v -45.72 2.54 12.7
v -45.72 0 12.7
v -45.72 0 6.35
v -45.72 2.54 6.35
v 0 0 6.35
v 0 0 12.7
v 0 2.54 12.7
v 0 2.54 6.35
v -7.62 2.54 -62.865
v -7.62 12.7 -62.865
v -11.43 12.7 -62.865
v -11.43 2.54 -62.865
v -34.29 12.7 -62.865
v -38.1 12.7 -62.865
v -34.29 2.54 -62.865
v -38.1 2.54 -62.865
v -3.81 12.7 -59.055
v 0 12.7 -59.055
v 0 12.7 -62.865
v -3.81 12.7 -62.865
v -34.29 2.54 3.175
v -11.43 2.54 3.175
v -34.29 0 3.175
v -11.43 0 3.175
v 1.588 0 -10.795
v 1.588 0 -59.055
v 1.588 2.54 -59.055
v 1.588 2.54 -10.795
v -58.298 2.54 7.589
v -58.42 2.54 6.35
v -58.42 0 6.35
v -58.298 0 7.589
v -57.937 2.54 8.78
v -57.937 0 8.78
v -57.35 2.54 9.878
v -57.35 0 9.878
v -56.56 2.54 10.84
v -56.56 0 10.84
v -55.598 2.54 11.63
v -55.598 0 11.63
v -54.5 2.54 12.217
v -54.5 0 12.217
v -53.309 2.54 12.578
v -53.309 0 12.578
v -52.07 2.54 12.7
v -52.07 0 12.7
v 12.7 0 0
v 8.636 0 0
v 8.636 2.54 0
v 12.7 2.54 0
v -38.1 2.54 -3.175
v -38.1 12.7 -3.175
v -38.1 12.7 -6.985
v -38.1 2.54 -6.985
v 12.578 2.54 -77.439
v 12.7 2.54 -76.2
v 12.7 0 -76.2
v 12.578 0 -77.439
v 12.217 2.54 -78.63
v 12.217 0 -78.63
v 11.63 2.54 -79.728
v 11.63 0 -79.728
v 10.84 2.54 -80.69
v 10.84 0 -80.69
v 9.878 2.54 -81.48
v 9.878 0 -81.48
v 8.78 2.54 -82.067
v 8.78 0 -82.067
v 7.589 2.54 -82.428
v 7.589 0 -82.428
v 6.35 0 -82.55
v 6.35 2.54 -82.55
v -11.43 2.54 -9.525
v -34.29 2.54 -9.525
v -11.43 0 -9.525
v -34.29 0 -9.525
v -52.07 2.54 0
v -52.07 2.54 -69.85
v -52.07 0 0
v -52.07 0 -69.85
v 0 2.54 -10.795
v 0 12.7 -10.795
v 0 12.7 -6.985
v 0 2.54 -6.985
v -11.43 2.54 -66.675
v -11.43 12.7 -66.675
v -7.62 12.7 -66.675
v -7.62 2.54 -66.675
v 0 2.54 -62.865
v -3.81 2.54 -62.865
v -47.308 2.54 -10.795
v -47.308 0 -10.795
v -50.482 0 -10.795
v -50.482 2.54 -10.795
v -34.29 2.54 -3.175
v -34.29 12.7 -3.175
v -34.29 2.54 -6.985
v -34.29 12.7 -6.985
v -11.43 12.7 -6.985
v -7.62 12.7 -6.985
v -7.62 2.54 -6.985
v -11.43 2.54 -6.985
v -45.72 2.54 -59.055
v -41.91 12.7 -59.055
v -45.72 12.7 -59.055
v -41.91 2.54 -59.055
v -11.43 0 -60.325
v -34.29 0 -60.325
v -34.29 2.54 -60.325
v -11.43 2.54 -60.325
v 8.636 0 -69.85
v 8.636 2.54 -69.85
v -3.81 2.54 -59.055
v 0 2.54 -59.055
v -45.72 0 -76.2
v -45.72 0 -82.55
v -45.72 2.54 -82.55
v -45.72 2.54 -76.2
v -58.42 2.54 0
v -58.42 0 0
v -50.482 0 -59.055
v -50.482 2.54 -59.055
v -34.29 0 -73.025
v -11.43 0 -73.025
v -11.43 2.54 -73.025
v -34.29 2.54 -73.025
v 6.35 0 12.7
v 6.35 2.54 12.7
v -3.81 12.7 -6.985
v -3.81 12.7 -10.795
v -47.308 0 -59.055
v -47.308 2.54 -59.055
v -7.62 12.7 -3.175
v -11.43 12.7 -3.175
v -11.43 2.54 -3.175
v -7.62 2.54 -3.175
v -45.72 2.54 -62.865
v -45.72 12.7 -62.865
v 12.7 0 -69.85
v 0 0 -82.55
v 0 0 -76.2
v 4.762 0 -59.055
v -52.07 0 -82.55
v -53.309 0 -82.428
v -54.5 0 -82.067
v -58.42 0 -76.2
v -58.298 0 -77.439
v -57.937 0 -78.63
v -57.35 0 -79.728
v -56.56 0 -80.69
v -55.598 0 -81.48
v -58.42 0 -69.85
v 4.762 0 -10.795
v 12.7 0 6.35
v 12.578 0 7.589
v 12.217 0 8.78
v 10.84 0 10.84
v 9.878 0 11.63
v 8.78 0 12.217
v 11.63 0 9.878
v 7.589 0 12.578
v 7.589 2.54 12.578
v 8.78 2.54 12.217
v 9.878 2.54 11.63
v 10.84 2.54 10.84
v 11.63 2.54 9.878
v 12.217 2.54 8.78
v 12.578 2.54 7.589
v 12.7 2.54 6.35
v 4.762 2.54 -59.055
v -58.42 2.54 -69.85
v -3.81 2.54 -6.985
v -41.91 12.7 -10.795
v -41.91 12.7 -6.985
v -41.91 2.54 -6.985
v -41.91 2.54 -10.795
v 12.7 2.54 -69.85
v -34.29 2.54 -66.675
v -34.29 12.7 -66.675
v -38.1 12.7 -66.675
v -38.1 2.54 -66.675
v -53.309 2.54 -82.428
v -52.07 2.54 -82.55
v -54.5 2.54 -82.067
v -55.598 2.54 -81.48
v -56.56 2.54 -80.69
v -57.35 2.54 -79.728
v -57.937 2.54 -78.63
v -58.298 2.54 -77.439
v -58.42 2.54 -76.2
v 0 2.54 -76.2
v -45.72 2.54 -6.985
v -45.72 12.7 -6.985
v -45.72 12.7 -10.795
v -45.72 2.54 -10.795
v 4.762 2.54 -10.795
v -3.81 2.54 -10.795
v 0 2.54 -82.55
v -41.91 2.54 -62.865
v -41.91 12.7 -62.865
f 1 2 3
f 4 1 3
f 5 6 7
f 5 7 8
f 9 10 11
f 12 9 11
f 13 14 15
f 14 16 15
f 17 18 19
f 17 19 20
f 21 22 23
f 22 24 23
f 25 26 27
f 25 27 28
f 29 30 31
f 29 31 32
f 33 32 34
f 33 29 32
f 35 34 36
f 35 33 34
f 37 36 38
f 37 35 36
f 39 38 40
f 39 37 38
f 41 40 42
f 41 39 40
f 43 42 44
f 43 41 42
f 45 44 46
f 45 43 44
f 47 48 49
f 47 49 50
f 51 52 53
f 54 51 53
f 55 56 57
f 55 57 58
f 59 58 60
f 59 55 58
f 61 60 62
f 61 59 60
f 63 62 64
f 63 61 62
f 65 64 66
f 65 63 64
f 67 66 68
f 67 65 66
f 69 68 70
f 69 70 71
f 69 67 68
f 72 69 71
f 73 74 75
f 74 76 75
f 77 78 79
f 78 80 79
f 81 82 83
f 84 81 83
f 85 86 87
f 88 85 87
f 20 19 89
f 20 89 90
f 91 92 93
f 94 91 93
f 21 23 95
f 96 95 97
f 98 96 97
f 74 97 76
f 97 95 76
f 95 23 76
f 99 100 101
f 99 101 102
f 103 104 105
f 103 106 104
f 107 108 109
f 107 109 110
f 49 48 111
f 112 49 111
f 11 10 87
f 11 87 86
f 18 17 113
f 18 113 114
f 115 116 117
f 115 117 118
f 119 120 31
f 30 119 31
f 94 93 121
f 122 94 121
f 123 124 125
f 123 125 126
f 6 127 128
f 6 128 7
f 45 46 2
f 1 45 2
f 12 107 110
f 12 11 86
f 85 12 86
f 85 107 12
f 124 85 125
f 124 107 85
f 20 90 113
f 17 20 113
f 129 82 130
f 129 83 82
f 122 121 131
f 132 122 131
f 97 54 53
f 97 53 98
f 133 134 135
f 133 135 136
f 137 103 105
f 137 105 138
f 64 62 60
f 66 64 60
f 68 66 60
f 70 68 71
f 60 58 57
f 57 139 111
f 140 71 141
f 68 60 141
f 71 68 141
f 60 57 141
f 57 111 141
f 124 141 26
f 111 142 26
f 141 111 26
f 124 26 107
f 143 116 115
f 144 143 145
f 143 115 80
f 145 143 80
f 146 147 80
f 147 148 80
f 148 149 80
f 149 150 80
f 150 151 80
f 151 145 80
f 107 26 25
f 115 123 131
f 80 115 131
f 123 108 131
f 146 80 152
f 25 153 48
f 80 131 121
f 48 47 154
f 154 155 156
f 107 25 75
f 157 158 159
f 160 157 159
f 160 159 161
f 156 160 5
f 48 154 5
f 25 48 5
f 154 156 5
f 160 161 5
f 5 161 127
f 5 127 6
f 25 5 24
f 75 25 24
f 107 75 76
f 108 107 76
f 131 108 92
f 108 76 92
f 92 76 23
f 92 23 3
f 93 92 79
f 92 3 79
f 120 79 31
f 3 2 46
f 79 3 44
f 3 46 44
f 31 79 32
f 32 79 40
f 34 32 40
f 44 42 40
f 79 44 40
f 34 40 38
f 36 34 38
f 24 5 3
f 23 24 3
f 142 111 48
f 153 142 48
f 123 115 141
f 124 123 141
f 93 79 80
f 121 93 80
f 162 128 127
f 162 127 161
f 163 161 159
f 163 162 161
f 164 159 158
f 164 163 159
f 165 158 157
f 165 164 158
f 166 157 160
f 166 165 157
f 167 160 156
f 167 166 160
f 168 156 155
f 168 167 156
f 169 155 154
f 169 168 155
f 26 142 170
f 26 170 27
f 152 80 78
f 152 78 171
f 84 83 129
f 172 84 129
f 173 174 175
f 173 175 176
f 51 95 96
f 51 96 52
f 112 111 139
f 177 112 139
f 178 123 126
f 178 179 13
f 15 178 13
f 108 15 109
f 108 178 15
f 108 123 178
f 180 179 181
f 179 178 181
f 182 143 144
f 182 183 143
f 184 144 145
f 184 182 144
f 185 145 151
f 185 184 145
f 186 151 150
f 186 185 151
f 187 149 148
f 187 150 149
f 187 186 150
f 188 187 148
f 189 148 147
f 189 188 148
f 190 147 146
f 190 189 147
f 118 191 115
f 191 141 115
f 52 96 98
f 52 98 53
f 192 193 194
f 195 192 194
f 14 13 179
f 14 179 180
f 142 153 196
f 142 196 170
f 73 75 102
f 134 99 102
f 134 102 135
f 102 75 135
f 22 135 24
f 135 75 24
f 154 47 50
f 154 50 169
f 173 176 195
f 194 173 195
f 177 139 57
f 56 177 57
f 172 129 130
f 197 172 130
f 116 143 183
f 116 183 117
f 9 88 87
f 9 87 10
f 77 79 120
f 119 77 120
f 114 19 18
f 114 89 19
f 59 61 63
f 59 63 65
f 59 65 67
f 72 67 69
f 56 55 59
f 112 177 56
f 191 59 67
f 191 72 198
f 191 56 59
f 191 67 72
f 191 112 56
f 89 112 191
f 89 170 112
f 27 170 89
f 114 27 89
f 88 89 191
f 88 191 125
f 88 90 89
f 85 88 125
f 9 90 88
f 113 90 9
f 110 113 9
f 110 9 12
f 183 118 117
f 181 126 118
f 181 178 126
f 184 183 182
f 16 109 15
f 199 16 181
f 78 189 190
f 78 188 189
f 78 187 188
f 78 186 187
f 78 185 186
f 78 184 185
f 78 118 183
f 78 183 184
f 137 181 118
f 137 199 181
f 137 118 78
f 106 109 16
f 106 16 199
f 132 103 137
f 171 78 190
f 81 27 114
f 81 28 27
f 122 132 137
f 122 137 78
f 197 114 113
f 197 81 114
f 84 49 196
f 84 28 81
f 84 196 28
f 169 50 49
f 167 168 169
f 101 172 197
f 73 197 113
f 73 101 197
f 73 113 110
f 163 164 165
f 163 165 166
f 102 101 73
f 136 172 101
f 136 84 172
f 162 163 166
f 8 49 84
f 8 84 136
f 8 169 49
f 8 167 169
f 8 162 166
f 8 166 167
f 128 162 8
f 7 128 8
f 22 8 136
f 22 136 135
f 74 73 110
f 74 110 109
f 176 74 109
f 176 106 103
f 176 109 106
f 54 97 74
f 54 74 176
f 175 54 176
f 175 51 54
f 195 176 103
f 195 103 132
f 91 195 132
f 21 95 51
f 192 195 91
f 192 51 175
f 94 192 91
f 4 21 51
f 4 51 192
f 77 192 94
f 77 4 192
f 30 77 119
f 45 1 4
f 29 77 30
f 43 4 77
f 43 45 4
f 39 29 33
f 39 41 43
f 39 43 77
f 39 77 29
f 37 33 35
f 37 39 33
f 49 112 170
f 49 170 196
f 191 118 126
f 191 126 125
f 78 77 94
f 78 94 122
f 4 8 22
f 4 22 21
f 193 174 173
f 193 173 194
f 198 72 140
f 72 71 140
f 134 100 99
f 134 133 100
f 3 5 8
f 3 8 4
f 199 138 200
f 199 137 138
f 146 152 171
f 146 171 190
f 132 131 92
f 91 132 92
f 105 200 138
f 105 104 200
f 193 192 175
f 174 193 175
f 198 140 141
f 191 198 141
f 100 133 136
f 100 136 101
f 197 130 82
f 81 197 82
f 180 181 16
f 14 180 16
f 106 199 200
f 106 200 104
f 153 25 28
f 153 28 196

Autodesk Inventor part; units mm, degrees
ref_plane "YZ Plane" through (0, 0, 0) normal (1, 0, 0) x (0, 1, 0)
ref_plane "XZ Plane" through (0, 0, 0) normal (0, 1, 0) x (-1, 0, 0)
ref_plane "XY Plane" through (0, 0, 0) normal (0, 0, 1) x (1, 0, 0)
sketch "Sketch1" plane through (0, 0, 0) normal (0, 1, 0) x (-1, 0, 0)
  line L0 (45.72, 0) -> (45.72, -69.85)
  line L1 (0, -69.85) -> (0, 0)
  line L2 (45.72, -69.85) -> (58.42, -69.85)
  line L3 (58.42, -69.85) -> (58.42, -82.55)
  line L4 (58.42, -82.55) -> (45.72, -82.55)
  line L5 (45.72, -82.55) -> (45.72, -69.85)
  line L6 (45.72, 0) -> (58.42, 0)
  line L7 (58.42, 0) -> (58.42, 12.7)
  line L8 (58.42, 12.7) -> (45.72, 12.7)
  line L9 (45.72, 12.7) -> (45.72, 0)
  line L10 (0, 0) -> (-12.7, 0)
  line L11 (-12.7, 0) -> (-12.7, 12.7)
  line L12 (-12.7, 12.7) -> (0, 12.7)
  line L13 (0, 12.7) -> (0, 0)
  line L14 (0, -69.85) -> (-12.7, -69.85)
  line L15 (-12.7, -69.85) -> (-12.7, -82.55)
  line L16 (-12.7, -82.55) -> (0, -82.55)
  line L17 (0, -82.55) -> (0, -69.85)
  line L18 (0, 0) -> (0, 6.35)
  line L19 (0, 6.35) -> (45.72, 6.35)
  line L20 (45.72, 6.35) -> (45.72, 0)
  line L21 (0, -69.85) -> (0, -76.2)
  line L22 (0, -76.2) -> (45.72, -76.2)
  line L23 (45.72, -76.2) -> (45.72, -69.85)
  line L24 (45.72, -69.85) -> (52.07, -69.85)
  line L25 (52.07, -69.85) -> (52.07, 0)
  line L26 (52.07, 0) -> (45.72, 0)
  line L27 (45.72, 0) -> (45.72, -69.85)
  line L28 (0, 0) -> (-8.636, 0)
  line L29 (-8.636, 0) -> (-8.636, -69.85)
  line L30 (-8.636, -69.85) -> (0, -69.85)
  line L31 (0, -69.85) -> (0, 0)
  line L32 (0, 3.175) -> (0, -9.525)
  line L33 (45.72, -9.525) -> (45.72, 3.175)
  line L34 (0, -73.025) -> (0, -60.325)
  line L35 (45.72, -60.325) -> (45.72, -73.025)
  line L36 (34.29, -60.325) -> (11.43, -60.325)
  line L37 (11.43, -60.325) -> (11.43, -73.025)
  line L38 (11.43, -73.025) -> (34.29, -73.025)
  line L39 (34.29, -73.025) -> (34.29, -60.325)
  line L40 (34.29, -9.525) -> (11.43, -9.525)
  line L41 (11.43, -9.525) -> (11.43, 3.175)
  line L42 (11.43, 3.175) -> (34.29, 3.175)
  line L43 (34.29, 3.175) -> (34.29, -9.525)
  line L44 (11.43, -3.175) -> (7.62, -3.175)
  line L45 (7.62, -3.175) -> (7.62, -6.985)
  line L46 (7.62, -6.985) -> (11.43, -6.985)
  line L47 (11.43, -6.985) -> (11.43, -3.175)
  line L48 (0, -6.985) -> (3.81, -6.985)
  line L49 (3.81, -6.985) -> (3.81, -10.795)
  line L50 (3.81, -10.795) -> (0, -10.795)
  line L51 (0, -10.795) -> (0, -6.985)
  line L52 (38.1, -62.865) -> (34.29, -62.865)
  line L53 (38.1, -66.675) -> (38.1, -62.865)
  line L54 (34.29, -66.675) -> (38.1, -66.675)
  line L55 (45.72, -62.865) -> (41.91, -62.865)
  line L56 (41.91, -62.865) -> (41.91, -59.055)
  line L57 (41.91, -59.055) -> (45.72, -59.055)
  line L58 (7.62, -62.865) -> (11.43, -62.865)
  line L59 (7.62, -66.675) -> (7.62, -62.865)
  line L60 (11.43, -66.675) -> (7.62, -66.675)
  line L61 (0, -62.865) -> (3.81, -62.865)
  line L62 (3.81, -62.865) -> (3.81, -59.055)
  line L63 (3.81, -59.055) -> (0, -59.055)
  line L64 (41.91, -10.795) -> (45.72, -10.795)
  line L65 (41.91, -6.985) -> (41.91, -10.795)
  line L66 (45.72, -6.985) -> (41.91, -6.985)
  line L67 (38.1, -6.985) -> (34.29, -6.985)
  line L68 (38.1, -3.175) -> (38.1, -6.985)
  line L69 (34.29, -3.175) -> (38.1, -3.175)
  line L70 (36.195, -10.795) -> (9.525, -10.795)
  line L71 (9.525, -10.795) -> (9.525, -59.055)
  line L72 (9.525, -59.055) -> (36.195, -59.055)
  line L73 (36.195, -59.055) -> (36.195, -10.795)
  line L74 (47.3075, -10.795) -> (50.4825, -10.795)
  line L75 (50.4825, -10.795) -> (50.4825, -59.055)
  line L76 (50.4825, -59.055) -> (47.3075, -59.055)
  line L77 (47.3075, -59.055) -> (47.3075, -10.795)
  line L78 (22.86, -34.925) -> (22.86, -41.845)
  line L79 (-1.5875, -10.795) -> (-4.7625, -10.795)
  line L80 (-4.7625, -10.795) -> (-4.7625, -59.055)
  line L81 (-4.7625, -59.055) -> (-1.5875, -59.055)
  line L82 (-1.5875, -59.055) -> (-1.5875, -10.795)
  dimension "d0" = 45.72
  dimension "d1" = 69.85
  dimension "d2" = 12.7
  dimension "d3" = 12.7
  dimension "d4" = 12.7
  dimension "d5" = 12.7
  dimension "d6" = 12.7
  dimension "d7" = 12.7
  dimension "d8" = 12.7
  dimension "d9" = 12.7
  dimension "d10" = 6.35
  dimension "d11" = 6.35
  dimension "d12" = 6.35
  dimension "d13" = 12.7
  dimension "d14" = 12.7
  dimension "d15" = 11.43
  dimension "d16" = 22.86
  dimension "d17" = 12.7
  dimension "d18" = 3.81
  dimension "d19" = 3.81
  dimension "d20" = 3.81
  dimension "d21" = 3.81
  dimension "d24" = 360
  dimension "d28" = 360
  dimension "d34" = 1.5875
  dimension "d35" = 3.175
extrude "Extrusion1" add sketch "Sketch1" along normal blind 2.54 contours L6 L25 L2 L0 | L9 L8 L7 L6 | L0 L66 L65 L64 L57 L56 L55 L5 L22 L17 L1 L61 L62 L63 L50 L49 L48 L13 L19 L9 | L2 L3 L4 L5 | L13 L10 L11 L12 | L1 L14 L29 L10 | L17 L16 L15 L14 | L73 L72 L71 L70
extrude "Extrusion2" add sketch "Sketch1" along normal blind 12.7 contours L0 L64 L65 L66 | L0 L55 L56 L57 | L48 L49 L50 L1 | L1 L63 L62 L61 | L52 L53 L54 L39 | L37 L60 L59 L58 | L43 L69 L68 L67 | L46 L45 L44 L41
fillet "Fillet1" radius 6.35 4 edges at (-58.42, 1.27, 12.7) (12.7, 1.27, 12.7) (12.7, 1.27, -82.55) (-58.42, 1.27, -82.55)
equation "\"BendRadius\" = Thickness"
equation "\"BendReliefWidth\" = Thickness"
equation "\"BendReliefDepth\" = 0.5 * Thickness"
equation "\"CornerReliefSize\" = 4 * Thickness"
equation "\"MinimumRemnant\" = 2 * Thickness"
equation "\"TransitionRadius\" = BendRadius"
equation "\"JacobiRadiusSize\" = BendRadius"
equation "\"GapSize\" = Thickness"
equation "\"Thickness\" = 3.048"
properties part number "PixfalconCover"
